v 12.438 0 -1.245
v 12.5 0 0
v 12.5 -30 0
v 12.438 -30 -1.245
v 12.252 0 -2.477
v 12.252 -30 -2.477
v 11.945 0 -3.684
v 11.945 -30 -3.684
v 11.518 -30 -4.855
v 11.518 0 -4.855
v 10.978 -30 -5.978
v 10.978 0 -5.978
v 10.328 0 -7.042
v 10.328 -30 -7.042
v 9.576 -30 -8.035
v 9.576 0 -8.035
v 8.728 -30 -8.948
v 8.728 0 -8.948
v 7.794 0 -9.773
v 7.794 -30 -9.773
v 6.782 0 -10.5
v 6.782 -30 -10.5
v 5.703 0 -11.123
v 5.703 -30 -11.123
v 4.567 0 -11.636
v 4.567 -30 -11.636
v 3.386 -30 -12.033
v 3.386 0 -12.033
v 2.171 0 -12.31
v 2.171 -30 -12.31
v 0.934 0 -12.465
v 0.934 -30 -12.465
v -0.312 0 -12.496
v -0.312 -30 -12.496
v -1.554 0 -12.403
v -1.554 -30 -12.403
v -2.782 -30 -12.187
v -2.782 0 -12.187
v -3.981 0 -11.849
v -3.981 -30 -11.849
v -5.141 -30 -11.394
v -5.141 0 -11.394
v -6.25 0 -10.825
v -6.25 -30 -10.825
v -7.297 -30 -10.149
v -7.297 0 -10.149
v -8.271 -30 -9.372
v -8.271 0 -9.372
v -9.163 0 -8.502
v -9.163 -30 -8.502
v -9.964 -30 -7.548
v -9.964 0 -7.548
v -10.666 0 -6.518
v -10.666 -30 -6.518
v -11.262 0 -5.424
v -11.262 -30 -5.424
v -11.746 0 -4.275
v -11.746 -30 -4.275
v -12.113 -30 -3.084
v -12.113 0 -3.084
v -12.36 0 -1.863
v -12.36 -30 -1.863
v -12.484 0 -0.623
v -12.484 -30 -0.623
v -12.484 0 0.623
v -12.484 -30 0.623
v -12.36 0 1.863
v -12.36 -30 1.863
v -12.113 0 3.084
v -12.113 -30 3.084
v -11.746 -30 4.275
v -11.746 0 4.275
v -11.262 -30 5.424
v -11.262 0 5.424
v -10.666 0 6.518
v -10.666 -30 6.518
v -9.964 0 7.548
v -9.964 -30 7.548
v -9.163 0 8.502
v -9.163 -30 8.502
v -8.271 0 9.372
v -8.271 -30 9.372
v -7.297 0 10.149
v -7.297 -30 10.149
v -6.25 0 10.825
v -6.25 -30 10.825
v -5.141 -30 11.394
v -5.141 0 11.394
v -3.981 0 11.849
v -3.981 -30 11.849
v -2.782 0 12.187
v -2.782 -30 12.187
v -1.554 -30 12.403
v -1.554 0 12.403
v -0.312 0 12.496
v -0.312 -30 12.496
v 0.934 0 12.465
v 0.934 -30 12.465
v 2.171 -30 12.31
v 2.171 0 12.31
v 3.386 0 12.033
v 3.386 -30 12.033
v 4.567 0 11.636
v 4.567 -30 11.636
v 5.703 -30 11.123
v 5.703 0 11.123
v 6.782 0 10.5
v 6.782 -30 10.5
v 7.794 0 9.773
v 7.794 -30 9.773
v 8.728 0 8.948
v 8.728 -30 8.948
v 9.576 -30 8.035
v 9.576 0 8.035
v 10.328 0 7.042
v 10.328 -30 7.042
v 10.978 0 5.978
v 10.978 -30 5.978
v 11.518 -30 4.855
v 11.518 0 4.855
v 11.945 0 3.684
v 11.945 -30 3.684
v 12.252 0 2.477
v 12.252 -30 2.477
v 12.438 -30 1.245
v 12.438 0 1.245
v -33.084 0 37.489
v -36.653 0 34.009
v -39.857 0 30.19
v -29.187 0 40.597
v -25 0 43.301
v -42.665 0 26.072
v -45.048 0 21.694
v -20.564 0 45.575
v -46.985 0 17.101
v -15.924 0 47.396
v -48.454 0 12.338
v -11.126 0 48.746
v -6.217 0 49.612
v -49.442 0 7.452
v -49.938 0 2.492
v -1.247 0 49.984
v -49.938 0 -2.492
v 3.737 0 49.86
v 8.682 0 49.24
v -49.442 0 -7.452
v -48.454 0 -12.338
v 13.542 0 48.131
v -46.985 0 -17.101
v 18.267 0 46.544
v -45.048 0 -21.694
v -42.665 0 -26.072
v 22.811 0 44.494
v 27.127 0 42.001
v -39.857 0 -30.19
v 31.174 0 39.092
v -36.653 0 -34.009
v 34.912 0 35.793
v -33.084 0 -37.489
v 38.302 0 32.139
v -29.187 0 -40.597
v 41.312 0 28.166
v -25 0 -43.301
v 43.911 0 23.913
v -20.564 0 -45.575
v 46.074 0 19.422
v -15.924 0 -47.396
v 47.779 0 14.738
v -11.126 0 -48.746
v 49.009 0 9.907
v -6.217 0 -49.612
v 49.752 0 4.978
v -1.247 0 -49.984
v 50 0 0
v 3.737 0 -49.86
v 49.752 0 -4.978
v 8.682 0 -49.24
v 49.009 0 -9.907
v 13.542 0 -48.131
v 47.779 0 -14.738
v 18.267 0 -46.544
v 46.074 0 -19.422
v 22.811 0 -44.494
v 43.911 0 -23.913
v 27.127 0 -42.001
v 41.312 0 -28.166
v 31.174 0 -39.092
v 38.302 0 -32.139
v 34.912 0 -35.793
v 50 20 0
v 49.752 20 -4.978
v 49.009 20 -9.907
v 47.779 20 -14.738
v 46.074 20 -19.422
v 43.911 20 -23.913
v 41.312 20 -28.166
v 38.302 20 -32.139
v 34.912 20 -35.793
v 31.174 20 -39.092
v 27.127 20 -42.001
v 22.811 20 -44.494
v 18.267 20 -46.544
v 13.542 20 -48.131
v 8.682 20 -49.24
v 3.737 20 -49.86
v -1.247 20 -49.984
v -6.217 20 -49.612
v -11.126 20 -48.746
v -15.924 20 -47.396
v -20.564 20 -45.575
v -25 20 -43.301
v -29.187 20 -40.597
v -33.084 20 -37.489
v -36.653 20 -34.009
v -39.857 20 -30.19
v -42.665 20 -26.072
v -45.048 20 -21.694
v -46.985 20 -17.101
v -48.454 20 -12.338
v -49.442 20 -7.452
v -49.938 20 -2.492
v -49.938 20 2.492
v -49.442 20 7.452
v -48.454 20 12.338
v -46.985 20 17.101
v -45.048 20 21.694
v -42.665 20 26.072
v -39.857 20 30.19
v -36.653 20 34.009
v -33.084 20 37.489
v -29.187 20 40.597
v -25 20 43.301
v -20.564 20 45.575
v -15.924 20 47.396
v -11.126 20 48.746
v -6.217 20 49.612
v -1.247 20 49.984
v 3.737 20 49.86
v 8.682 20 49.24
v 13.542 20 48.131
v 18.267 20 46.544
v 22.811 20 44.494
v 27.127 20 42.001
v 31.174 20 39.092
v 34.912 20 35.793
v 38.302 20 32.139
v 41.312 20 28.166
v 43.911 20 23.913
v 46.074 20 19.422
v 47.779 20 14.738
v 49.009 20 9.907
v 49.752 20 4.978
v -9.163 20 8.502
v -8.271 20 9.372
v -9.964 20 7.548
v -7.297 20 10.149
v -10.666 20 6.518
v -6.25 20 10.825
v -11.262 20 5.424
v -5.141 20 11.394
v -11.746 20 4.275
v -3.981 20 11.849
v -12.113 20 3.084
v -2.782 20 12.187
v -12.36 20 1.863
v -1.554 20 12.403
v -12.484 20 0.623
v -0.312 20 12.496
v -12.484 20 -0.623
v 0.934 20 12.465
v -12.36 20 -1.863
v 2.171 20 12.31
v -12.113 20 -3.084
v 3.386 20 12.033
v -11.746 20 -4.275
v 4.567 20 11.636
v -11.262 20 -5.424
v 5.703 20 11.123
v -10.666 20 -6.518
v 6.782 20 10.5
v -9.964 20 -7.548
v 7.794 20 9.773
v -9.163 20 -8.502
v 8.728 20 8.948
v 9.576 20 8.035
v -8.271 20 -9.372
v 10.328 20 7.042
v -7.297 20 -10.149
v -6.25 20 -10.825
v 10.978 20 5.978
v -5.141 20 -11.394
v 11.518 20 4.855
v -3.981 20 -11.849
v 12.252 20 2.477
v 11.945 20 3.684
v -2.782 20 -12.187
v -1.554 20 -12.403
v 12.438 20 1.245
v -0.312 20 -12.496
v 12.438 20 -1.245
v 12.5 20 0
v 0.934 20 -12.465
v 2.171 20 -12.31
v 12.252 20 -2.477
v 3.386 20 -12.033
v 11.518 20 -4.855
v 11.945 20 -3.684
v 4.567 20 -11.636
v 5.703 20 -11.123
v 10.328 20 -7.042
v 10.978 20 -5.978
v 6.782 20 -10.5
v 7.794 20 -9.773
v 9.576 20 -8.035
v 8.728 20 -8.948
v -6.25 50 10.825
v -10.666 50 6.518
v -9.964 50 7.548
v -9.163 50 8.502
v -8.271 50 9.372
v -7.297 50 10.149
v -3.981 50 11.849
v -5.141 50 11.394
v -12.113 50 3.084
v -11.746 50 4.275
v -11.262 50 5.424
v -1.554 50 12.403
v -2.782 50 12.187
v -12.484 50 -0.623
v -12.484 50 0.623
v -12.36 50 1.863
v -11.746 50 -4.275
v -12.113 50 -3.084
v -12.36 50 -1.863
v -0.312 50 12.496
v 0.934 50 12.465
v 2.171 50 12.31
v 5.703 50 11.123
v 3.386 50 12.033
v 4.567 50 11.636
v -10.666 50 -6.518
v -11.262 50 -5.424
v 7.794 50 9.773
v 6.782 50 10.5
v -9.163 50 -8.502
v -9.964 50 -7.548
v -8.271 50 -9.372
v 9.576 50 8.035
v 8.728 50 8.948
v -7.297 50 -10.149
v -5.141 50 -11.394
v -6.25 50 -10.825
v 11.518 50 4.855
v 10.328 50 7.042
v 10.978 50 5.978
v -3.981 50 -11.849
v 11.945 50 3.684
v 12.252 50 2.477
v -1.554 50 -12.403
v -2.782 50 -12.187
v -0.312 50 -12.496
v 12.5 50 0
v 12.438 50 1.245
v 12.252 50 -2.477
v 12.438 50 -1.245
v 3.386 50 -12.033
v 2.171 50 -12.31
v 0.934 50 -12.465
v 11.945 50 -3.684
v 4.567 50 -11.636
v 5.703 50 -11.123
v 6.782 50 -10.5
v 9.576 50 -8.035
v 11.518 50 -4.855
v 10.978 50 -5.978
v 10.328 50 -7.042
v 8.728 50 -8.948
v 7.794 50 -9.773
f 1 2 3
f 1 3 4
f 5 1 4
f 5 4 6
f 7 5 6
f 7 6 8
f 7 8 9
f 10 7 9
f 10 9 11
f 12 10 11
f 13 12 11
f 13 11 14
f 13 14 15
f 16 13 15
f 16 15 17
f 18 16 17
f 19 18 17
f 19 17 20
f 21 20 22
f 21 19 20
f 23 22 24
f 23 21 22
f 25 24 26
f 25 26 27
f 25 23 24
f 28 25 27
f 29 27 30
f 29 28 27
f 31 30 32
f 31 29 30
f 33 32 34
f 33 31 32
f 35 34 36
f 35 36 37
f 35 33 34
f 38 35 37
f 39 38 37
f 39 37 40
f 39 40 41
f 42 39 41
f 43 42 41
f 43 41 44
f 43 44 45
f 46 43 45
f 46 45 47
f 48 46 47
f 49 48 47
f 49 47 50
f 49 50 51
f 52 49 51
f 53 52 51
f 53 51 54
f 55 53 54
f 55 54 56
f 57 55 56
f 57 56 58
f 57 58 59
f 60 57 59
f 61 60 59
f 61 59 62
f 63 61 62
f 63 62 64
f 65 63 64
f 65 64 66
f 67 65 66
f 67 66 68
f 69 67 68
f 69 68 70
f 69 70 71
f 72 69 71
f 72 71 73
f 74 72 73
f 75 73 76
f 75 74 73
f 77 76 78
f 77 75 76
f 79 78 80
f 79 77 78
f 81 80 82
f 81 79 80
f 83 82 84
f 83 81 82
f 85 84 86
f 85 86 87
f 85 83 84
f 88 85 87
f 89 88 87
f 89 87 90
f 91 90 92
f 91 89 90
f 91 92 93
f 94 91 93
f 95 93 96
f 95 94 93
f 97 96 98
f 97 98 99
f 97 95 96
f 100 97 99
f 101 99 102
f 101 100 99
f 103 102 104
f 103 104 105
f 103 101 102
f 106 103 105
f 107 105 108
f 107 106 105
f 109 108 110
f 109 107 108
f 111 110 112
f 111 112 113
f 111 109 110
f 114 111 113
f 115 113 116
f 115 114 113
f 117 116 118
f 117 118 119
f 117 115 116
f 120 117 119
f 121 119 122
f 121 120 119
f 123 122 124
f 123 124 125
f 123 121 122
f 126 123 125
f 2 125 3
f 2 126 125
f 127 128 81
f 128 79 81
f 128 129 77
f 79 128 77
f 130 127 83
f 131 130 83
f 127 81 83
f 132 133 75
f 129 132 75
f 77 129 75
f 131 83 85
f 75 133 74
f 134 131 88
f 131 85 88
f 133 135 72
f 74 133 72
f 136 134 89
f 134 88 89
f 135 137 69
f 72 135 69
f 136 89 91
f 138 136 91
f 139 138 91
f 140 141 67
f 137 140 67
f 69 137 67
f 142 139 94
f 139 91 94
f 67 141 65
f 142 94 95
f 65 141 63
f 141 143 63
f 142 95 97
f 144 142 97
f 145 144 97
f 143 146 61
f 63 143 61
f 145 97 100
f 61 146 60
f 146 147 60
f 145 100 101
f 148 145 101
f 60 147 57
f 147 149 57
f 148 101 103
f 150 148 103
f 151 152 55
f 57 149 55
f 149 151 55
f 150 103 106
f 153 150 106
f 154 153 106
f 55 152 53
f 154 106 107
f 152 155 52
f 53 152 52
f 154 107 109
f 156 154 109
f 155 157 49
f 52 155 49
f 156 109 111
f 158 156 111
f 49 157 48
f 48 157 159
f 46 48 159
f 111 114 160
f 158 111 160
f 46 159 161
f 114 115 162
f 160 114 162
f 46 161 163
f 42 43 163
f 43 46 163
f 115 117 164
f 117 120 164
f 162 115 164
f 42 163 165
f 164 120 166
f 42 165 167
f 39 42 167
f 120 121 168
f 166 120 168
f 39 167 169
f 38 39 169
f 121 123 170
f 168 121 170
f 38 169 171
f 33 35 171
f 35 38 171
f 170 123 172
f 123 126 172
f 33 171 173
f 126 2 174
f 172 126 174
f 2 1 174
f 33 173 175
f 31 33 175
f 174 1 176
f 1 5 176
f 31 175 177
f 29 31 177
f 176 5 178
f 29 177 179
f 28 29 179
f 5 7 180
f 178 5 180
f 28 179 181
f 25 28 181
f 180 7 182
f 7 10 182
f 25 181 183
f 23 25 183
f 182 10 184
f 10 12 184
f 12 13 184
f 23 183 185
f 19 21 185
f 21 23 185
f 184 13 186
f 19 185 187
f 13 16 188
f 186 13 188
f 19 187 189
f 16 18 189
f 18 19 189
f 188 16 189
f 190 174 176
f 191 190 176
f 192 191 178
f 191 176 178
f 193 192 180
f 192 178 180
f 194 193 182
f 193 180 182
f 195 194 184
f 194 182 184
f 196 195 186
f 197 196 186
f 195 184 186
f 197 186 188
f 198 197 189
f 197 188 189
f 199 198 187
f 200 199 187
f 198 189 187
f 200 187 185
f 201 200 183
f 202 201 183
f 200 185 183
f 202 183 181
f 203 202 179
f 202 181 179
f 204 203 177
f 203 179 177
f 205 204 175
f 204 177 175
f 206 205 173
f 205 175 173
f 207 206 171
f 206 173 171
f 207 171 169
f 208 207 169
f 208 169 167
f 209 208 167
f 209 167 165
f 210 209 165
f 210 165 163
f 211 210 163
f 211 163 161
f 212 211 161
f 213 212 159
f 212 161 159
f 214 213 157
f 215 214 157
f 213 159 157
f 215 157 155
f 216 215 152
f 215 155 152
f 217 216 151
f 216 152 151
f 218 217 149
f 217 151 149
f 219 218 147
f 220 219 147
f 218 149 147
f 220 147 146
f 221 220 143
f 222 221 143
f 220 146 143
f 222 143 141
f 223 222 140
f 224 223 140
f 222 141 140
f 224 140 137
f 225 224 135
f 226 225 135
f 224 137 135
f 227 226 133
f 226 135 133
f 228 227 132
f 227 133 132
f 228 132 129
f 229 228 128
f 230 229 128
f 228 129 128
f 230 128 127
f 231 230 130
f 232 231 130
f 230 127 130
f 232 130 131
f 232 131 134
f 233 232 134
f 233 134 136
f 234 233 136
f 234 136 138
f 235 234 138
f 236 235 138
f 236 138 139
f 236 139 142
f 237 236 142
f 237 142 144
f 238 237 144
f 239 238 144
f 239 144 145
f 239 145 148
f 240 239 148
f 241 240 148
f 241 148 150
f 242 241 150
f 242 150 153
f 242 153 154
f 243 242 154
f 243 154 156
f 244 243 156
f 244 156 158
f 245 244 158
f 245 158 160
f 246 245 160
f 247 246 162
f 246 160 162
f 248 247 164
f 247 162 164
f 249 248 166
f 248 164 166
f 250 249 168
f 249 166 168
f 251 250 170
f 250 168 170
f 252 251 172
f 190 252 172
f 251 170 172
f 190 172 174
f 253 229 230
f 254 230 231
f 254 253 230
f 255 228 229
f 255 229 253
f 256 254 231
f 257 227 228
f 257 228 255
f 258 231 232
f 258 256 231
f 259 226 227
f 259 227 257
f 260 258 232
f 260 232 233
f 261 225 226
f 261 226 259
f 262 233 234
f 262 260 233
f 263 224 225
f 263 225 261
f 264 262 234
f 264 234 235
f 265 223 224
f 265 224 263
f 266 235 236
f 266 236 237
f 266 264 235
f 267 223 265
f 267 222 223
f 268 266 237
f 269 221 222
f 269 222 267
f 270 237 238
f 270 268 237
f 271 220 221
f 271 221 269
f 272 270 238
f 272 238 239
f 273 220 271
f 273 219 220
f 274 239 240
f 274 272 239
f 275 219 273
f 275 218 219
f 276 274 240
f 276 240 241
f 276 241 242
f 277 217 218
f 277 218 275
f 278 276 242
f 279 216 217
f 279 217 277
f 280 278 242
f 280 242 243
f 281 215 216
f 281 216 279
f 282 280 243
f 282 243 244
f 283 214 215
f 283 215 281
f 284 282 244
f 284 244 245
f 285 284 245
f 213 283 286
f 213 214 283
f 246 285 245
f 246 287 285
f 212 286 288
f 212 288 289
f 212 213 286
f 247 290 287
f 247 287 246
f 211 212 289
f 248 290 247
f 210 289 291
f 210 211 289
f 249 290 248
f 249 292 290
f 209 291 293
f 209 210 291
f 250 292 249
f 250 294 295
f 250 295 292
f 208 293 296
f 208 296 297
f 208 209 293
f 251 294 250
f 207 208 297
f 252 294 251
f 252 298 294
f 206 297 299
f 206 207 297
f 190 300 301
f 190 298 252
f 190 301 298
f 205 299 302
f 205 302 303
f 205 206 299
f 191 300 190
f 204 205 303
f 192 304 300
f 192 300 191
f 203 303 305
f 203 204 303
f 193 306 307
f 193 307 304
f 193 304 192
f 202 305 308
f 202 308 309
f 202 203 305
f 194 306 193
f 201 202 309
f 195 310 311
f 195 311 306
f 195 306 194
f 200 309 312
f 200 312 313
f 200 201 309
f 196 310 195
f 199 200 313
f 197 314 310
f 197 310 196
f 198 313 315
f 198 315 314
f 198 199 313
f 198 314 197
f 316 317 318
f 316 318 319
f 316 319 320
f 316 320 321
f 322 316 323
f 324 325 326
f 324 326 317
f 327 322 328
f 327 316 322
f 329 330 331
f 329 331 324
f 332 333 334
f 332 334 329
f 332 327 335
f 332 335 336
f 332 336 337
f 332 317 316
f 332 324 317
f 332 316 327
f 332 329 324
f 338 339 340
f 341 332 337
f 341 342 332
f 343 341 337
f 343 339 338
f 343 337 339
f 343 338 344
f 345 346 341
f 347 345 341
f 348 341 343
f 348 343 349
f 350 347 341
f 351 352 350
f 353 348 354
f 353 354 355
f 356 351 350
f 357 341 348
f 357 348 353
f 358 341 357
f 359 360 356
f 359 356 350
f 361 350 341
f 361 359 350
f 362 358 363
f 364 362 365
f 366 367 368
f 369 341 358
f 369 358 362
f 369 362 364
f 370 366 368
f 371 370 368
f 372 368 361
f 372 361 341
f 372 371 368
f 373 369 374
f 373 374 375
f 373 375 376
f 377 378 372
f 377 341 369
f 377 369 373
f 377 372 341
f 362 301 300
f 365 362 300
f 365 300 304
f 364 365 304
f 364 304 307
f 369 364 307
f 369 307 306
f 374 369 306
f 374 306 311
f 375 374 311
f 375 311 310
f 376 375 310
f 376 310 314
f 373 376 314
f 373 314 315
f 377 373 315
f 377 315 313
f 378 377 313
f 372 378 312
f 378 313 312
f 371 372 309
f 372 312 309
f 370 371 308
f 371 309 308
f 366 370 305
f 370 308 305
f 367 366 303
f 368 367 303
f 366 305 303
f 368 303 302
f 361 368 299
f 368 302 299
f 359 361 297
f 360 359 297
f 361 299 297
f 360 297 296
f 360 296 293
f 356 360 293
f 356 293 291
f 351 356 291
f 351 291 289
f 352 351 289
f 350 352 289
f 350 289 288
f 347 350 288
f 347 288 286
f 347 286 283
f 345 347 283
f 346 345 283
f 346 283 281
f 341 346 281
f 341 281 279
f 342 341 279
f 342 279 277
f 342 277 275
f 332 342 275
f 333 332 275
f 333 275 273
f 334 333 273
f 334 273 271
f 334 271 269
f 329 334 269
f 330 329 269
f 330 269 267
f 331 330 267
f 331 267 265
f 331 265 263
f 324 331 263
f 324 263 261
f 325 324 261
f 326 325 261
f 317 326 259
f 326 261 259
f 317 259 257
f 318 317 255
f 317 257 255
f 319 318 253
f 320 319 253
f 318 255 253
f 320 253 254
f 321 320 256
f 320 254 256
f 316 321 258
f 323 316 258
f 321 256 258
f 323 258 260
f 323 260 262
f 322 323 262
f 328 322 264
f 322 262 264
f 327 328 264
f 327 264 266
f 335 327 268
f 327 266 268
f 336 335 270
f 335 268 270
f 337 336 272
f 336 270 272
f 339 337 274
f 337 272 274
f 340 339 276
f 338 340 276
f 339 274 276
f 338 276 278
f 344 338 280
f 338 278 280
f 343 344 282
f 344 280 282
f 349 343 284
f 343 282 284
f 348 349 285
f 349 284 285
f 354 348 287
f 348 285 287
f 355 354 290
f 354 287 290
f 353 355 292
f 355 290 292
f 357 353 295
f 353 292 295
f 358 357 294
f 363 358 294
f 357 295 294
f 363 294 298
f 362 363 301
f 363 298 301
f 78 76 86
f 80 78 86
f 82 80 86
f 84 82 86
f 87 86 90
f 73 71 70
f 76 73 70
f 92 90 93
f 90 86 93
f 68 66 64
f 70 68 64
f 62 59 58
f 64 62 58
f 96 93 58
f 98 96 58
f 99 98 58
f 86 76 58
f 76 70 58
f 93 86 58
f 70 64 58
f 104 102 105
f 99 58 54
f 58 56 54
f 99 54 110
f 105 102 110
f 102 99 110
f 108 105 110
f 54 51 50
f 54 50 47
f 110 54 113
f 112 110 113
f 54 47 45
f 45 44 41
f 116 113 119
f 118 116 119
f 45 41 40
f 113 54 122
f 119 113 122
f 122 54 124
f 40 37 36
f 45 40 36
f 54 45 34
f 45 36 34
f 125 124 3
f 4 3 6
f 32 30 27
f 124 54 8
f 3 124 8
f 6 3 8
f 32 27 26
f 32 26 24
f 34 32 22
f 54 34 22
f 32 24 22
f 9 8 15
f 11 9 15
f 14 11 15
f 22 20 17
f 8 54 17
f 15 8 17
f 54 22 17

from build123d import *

# Parameters (mm, degrees)
ESBO_O2_R                     = 50
RESSALTO_EXTRUS_O1_DEPTH      = 20
ESBO_O3_R                     = 12.5
RESSALTO_EXTRUS_O2_DEPTH      = 40
RESSALTO_EXTRUS_O2_DEPTH_BACK = 40


with BuildPart() as part:
    # Esboço2 → Ressalto-extrusão1 (new body)
    with BuildSketch(Plane(origin=(0, 0, 0), x_dir=(1, 0, 0), z_dir=(0, 1, 0))):
        Circle(ESBO_O2_R)
    extrude(amount=RESSALTO_EXTRUS_O1_DEPTH)

    # Esboço3 → Ressalto-extrusão2 (add, two sides)
    with BuildSketch(Plane(origin=(0, 10, 0), x_dir=(1, 0, 0), z_dir=(0, 1, 0))) as ressalto_extrus_o2_sk:
        Circle(ESBO_O3_R)
    extrude(amount=RESSALTO_EXTRUS_O2_DEPTH)
    extrude(ressalto_extrus_o2_sk.sketch, amount=-RESSALTO_EXTRUS_O2_DEPTH_BACK)


solid = part.part
